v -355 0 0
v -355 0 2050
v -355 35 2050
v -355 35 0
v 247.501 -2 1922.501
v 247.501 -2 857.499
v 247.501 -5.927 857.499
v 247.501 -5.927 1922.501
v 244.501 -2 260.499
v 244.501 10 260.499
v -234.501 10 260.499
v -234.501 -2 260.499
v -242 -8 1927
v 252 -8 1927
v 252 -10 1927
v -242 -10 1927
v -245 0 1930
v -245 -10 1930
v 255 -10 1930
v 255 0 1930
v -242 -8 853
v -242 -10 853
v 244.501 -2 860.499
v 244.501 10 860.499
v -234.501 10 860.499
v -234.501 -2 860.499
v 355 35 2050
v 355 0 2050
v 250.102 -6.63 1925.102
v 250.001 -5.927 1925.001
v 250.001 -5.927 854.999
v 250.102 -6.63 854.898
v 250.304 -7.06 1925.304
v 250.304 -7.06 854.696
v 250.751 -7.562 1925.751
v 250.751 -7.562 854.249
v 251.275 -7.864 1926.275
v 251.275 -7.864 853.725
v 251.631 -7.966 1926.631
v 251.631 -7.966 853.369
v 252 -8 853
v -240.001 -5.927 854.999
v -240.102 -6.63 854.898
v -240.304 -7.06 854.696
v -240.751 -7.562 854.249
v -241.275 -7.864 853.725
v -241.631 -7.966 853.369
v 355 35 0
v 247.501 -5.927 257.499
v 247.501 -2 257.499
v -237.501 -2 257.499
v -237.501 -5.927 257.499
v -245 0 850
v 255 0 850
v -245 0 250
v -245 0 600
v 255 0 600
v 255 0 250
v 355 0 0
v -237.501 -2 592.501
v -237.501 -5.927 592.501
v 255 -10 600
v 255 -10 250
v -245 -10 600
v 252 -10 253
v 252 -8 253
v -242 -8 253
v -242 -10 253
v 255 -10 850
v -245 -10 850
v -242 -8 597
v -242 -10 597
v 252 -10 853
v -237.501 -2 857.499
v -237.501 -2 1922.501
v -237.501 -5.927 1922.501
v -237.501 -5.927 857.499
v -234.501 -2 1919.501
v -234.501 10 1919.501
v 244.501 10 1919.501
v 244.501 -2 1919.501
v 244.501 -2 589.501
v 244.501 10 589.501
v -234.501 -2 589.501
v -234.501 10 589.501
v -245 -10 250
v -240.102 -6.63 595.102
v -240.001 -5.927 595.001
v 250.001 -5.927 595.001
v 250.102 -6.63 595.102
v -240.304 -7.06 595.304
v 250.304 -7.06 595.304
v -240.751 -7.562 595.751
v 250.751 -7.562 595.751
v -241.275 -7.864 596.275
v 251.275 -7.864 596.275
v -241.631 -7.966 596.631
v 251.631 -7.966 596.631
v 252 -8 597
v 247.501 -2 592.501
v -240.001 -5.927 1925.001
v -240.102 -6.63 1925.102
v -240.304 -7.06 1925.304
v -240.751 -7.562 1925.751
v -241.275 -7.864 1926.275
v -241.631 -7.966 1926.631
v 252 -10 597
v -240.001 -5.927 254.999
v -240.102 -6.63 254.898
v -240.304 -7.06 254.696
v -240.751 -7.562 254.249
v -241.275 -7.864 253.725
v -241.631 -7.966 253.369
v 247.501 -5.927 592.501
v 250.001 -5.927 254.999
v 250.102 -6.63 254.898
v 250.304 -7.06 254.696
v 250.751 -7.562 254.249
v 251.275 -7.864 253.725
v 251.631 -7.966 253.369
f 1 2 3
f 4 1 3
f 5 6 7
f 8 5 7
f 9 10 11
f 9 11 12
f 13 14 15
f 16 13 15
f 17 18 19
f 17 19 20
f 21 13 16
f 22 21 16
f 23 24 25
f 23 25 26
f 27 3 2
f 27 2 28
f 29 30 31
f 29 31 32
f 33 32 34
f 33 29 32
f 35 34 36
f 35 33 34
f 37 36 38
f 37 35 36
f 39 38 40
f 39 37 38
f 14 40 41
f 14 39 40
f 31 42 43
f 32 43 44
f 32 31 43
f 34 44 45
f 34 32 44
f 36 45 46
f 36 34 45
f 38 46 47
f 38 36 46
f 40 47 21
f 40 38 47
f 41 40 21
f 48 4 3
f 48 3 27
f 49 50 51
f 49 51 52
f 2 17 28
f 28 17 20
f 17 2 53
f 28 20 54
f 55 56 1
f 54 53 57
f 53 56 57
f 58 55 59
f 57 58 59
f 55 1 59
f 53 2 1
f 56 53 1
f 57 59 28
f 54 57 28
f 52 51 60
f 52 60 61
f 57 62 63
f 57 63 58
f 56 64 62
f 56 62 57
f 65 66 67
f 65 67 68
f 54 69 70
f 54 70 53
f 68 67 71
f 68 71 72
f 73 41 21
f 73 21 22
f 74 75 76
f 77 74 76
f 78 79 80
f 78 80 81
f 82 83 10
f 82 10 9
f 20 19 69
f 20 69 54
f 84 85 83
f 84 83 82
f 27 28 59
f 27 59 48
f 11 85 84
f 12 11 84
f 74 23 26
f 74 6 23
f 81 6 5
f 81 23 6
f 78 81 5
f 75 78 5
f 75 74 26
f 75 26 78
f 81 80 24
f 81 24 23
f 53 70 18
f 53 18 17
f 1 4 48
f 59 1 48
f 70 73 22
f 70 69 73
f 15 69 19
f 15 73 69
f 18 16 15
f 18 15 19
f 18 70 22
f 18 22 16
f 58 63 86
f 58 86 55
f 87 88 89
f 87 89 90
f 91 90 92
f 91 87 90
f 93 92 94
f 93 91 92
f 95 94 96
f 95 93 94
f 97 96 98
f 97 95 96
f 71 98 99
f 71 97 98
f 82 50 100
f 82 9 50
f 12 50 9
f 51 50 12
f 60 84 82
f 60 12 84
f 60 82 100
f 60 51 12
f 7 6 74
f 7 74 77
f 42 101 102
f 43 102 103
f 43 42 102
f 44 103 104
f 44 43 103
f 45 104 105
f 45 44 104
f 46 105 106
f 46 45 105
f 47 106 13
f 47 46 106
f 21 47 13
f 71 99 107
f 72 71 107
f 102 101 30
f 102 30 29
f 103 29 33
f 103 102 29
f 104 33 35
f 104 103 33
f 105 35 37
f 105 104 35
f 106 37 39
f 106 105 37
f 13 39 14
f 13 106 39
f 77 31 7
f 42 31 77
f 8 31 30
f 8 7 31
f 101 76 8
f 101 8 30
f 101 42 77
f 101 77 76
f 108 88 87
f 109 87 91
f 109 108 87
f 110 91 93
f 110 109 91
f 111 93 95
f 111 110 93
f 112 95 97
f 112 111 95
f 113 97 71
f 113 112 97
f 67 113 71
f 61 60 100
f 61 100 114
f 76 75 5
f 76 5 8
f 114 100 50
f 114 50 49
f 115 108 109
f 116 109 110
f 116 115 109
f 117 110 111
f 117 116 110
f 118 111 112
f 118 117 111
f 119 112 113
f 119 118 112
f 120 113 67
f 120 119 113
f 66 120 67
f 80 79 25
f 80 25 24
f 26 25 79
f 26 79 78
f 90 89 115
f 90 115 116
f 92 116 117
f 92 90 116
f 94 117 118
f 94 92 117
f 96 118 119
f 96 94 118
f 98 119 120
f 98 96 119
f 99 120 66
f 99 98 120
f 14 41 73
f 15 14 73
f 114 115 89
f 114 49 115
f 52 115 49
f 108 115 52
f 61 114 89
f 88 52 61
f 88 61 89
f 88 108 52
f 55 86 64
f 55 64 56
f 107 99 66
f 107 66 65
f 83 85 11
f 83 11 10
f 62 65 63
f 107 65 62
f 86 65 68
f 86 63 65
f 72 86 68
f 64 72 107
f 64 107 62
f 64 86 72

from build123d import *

# Parameters (mm, degrees)
F0_W     = 710
F0_H     = 35
F1_DEPTH = 2050
F2_W     = 500
F2_H     = 350
F2_H_2   = 1080
F3_DEPTH = 10


with BuildPart() as f1:
    # F0 (on Top) → F1 (new body)
    with BuildSketch(Plane.XY):
        with Locations((0, 17.5)):
            Rectangle(F0_W, F0_H)
    extrude(amount=F1_DEPTH)

    # F2 (on face) → F3 (cut)
    with BuildSketch(Plane.XZ):
        with Locations((5, 425)):
            Rectangle(F2_W, F2_H)
        with Locations((5, 1390)):
            Rectangle(F2_W, F2_H_2)
    extrude(amount=-F3_DEPTH, mode=Mode.SUBTRACT)

    # F6: sweep along a path in F5
    with BuildLine(Plane.XZ.offset(-10)) as f6_path:
        Line((255, 1930), (-245, 1930))
        Line((-245, 1930), (-245, 850))
        Line((-245, 850), (255, 850))
        Line((255, 850), (255, 1930))
    # F4 (on Right) → F6 (sweep)
    with BuildSketch(Plane.YZ):
        with BuildLine():
            Line((-10, 850), (10, 850))
            Line((10, 850), (10, 860.4986502942))
            Line((10, 860.4986502942), (-2, 860.4986502942))
            Line((-2, 860.4986502942), (-2, 857.4986502942))
            Line((-2, 857.4986502942), (-5.9265357135, 857.4986502942))
            Line((-5.9265357135, 857.4986502942), (-5.9265357135, 854.9986502942))
            ThreePointArc((-5.9265357135, 854.9986502942), (-7.387997015, 854.4399528765), (-8, 853))
            Line((-8, 853), (-10, 853))
            Line((-10, 853), (-10, 850))
        make_face()
    sweep(path=f6_path.line, transition=Transition.RIGHT)

    # F9: sweep along a path in F8
    with BuildLine(Plane.XZ.offset(-10)) as f9_path:
        Line((255, 600), (-245, 600))
        Line((-245, 600), (-245, 250))
        Line((-245, 250), (255, 250))
        Line((255, 250), (255, 600))
    # F7 (on Right) → F9 (sweep)
    with BuildSketch(Plane.YZ):
        with BuildLine():
            Line((-10, 250), (10, 250))
            Line((10, 250), (10, 260.4986502942))
            Line((10, 260.4986502942), (-2, 260.4986502942))
            Line((-2, 260.4986502942), (-2, 257.4986502942))
            Line((-2, 257.4986502942), (-5.9265357135, 257.4986502942))
            Line((-5.9265357135, 257.4986502942), (-5.9265357135, 254.9986502942))
            ThreePointArc((-5.9265357135, 254.9986502942), (-7.387997015, 254.4399528765), (-8, 253))
            Line((-8, 253), (-10, 253))
            Line((-10, 253), (-10, 250))
        make_face()
    sweep(path=f9_path.line, transition=Transition.RIGHT)


solid = f1.part
